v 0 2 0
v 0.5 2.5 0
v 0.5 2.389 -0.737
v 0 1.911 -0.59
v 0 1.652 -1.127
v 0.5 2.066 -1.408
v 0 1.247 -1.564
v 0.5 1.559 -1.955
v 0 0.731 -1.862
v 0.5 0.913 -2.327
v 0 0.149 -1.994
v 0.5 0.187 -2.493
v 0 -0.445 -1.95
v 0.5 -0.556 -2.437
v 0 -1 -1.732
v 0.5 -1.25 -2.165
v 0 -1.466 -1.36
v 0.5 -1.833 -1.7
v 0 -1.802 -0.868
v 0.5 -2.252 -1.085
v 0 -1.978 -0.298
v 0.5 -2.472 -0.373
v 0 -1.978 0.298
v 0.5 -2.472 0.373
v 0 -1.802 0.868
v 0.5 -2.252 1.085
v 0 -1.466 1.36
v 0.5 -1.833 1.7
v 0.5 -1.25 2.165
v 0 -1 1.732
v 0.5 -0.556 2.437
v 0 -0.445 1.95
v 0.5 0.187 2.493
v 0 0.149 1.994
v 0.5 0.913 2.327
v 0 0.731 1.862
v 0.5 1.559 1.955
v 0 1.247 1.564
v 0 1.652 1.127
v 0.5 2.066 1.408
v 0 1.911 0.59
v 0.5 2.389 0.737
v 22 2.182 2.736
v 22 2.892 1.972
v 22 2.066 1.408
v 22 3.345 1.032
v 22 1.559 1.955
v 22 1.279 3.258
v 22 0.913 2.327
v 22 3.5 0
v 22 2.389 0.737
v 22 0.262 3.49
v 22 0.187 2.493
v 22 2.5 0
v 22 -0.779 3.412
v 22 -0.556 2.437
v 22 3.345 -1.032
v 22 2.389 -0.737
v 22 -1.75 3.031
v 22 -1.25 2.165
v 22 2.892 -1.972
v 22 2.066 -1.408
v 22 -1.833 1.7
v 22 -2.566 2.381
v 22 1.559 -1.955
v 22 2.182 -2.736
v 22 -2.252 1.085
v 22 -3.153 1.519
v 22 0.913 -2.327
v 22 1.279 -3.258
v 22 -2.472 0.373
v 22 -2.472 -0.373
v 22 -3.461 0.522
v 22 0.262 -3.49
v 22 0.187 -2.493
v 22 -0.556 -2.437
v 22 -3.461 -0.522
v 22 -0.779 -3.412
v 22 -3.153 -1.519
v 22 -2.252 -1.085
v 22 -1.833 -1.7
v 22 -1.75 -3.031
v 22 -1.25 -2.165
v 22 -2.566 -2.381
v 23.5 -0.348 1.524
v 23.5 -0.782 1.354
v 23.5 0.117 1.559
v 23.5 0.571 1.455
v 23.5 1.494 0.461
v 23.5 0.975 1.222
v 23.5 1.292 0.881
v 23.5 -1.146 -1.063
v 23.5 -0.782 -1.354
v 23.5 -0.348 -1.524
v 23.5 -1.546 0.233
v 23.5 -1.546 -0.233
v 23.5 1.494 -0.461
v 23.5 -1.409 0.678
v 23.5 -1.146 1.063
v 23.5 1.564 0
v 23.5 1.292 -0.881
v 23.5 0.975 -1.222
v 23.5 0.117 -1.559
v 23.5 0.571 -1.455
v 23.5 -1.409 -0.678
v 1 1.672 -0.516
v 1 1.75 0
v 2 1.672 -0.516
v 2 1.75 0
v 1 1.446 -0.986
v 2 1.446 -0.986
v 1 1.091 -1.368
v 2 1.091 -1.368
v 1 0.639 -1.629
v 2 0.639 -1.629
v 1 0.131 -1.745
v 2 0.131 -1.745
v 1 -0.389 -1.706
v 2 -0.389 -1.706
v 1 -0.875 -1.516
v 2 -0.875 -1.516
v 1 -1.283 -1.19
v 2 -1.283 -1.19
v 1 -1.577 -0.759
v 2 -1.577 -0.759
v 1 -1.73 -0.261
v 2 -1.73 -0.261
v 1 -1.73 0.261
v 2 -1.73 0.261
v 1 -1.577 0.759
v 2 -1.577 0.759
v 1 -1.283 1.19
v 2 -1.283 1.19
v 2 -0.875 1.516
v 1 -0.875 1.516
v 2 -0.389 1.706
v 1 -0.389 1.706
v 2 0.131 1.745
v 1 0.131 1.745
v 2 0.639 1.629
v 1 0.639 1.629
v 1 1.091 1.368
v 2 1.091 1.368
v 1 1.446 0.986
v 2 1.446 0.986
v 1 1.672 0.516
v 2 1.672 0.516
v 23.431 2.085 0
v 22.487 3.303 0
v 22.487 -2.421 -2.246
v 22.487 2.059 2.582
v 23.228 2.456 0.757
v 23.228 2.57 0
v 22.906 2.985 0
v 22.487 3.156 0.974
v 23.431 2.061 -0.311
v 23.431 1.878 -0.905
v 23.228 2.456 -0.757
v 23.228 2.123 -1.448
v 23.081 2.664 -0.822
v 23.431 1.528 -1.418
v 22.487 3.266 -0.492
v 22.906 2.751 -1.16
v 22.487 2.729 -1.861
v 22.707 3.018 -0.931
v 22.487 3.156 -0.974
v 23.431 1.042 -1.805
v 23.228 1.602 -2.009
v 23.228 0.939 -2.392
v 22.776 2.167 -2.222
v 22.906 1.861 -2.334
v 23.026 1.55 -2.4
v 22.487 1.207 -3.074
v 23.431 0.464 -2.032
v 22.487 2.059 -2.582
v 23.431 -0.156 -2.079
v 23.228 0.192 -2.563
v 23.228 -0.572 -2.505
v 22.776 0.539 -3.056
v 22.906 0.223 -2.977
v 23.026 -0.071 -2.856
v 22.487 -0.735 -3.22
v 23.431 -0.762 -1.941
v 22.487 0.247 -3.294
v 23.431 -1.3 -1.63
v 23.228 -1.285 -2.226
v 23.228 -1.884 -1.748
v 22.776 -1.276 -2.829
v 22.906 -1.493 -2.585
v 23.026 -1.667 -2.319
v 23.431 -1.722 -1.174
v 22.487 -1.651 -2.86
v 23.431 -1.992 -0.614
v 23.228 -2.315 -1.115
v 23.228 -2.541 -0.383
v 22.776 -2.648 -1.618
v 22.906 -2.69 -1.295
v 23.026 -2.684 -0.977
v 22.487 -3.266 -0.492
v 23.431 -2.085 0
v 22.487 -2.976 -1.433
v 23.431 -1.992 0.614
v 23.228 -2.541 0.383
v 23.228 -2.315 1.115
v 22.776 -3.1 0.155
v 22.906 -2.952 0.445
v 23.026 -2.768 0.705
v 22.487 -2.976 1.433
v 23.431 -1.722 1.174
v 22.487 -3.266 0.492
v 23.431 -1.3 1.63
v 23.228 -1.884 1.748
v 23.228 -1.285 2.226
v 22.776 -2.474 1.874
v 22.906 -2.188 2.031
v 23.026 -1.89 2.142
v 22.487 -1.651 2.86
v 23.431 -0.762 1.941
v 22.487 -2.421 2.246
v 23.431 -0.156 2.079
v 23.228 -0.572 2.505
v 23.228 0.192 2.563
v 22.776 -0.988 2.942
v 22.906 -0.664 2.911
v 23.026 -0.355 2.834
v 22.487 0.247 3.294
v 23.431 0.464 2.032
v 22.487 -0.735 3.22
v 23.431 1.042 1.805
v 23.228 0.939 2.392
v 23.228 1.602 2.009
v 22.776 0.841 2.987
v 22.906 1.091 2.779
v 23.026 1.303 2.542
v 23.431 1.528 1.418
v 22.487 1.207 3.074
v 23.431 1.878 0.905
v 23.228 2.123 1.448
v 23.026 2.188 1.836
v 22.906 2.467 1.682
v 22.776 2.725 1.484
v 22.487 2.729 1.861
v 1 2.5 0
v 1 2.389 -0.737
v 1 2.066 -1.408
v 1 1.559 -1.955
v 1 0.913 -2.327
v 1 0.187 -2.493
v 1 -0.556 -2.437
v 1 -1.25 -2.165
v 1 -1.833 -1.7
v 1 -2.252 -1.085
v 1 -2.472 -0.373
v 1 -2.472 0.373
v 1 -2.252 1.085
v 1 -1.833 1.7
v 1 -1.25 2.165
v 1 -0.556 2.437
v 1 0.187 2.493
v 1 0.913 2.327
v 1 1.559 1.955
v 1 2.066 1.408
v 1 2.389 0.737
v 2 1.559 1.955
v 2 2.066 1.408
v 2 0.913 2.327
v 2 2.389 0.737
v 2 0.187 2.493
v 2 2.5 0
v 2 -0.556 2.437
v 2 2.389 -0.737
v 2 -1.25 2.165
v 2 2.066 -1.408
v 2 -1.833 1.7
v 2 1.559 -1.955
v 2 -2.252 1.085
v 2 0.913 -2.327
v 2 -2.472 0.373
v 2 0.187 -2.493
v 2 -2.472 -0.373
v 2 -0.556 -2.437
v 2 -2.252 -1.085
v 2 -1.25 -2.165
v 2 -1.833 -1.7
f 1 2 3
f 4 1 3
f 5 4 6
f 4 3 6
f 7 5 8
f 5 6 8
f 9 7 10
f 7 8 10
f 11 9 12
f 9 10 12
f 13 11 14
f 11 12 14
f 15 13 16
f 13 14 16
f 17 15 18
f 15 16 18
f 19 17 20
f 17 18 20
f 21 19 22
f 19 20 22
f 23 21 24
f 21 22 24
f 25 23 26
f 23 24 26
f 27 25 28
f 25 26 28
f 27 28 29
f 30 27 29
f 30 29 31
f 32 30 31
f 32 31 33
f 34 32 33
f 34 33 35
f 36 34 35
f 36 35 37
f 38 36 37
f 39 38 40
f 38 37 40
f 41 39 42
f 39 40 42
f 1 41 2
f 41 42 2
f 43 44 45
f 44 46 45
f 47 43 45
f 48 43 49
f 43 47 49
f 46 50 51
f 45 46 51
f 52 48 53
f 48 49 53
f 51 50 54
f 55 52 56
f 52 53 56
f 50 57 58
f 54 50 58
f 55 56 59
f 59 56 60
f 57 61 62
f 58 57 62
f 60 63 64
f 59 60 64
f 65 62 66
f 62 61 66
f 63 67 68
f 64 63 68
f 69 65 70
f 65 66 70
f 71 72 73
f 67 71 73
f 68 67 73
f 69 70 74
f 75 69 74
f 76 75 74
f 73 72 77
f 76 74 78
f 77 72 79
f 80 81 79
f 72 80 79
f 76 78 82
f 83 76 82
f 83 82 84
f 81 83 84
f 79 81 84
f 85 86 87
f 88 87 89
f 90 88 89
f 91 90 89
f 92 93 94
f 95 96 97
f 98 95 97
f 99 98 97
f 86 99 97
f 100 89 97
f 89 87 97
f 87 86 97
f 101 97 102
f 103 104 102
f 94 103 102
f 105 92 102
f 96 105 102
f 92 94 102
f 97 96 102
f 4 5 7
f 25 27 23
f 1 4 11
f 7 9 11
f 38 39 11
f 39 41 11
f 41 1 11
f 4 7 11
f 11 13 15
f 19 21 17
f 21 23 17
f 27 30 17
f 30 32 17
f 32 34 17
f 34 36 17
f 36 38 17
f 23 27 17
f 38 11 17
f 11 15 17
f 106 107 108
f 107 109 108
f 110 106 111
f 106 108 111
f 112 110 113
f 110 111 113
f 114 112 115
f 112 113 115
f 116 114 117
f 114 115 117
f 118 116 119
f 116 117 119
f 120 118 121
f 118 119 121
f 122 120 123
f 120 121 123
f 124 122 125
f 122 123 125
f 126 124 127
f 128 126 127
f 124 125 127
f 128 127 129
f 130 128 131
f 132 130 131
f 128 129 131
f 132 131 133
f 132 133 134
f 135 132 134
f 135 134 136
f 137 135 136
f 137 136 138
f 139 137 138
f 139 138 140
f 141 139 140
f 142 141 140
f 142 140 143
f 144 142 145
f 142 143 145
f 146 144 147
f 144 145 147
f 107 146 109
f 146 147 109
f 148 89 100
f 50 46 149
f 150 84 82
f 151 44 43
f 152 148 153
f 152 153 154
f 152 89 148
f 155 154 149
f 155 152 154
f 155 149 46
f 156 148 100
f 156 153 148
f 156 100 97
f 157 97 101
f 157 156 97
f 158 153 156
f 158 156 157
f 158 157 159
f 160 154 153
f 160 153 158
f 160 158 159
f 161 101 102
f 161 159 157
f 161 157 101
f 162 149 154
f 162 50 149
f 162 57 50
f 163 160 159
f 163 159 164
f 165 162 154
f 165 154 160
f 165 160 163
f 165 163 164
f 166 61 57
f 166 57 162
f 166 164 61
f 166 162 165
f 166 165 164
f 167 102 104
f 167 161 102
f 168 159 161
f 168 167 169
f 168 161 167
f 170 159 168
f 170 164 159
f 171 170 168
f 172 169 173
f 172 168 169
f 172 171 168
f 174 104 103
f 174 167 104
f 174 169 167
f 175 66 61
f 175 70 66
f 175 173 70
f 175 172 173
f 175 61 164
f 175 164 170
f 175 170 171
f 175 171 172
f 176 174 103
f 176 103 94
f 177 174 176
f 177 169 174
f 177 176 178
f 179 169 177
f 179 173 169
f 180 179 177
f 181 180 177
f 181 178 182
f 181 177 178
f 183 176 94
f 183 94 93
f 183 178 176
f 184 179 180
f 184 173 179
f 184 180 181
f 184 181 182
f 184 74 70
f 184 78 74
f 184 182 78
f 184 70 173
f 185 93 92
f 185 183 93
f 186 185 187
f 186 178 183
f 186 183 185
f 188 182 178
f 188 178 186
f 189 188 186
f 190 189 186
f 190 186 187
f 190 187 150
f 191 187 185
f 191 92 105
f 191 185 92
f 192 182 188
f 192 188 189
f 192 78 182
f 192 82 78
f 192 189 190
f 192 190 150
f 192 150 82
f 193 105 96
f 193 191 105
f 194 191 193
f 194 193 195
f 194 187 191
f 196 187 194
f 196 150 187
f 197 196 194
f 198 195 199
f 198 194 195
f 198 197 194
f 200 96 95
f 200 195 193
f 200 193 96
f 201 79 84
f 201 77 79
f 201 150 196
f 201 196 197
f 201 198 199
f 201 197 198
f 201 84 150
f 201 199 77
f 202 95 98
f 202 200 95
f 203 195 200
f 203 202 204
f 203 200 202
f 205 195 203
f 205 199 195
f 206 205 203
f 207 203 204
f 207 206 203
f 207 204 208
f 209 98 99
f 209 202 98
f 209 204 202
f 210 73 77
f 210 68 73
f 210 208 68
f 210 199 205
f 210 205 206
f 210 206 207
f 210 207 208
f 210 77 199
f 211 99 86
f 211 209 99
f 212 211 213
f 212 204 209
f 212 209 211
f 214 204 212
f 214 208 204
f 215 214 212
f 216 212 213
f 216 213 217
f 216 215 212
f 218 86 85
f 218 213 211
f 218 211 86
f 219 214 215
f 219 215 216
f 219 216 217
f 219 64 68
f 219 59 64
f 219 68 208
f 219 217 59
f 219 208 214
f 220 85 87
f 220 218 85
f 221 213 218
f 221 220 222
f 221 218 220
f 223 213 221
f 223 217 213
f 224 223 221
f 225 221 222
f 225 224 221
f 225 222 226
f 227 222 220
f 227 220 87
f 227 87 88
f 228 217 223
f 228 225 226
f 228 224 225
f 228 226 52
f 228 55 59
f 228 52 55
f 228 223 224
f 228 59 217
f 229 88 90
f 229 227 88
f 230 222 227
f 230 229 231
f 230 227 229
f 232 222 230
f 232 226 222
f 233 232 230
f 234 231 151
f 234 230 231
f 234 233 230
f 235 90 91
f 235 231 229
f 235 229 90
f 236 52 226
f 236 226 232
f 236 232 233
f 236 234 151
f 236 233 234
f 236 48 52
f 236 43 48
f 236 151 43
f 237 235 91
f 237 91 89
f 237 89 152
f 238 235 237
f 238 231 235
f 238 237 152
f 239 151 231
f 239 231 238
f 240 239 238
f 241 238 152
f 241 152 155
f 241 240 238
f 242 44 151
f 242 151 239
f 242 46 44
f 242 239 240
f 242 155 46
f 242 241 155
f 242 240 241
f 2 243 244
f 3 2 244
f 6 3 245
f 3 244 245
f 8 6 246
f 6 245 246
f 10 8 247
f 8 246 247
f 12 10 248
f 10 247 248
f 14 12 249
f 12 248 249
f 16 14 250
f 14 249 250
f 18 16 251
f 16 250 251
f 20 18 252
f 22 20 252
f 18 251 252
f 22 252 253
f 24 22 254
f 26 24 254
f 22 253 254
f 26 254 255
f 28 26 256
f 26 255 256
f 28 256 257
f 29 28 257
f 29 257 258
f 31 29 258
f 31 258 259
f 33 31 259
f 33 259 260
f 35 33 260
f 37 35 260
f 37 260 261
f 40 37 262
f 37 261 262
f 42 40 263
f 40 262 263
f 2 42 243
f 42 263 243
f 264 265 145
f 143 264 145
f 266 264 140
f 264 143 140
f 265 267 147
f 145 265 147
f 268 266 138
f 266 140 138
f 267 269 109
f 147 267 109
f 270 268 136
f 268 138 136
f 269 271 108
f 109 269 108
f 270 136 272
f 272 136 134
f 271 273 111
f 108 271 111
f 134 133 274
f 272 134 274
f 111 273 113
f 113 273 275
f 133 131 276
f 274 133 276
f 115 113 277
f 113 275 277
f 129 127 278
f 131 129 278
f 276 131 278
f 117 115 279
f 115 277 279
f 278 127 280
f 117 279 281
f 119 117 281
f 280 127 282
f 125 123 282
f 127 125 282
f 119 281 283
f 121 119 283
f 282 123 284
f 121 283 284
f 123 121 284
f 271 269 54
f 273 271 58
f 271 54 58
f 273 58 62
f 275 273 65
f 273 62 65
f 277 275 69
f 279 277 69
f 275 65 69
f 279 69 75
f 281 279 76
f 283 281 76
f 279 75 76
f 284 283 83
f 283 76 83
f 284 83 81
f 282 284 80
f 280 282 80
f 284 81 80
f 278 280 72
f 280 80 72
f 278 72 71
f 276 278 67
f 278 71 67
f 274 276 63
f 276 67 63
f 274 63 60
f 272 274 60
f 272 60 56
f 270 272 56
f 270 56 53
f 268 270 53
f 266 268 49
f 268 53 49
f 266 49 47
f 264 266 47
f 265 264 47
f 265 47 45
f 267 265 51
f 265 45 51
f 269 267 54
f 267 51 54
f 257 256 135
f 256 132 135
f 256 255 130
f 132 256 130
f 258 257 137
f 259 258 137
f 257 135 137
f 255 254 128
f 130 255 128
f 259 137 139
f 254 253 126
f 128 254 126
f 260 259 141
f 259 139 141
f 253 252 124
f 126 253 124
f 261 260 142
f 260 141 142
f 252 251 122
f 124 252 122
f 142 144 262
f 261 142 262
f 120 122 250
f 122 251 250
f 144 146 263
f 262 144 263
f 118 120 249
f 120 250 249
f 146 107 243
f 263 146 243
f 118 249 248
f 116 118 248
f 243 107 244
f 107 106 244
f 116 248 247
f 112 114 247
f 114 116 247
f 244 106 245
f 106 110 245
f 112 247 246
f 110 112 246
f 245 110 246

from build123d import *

# Parameters (mm, degrees)
FILLET1_R     = 2
CHAMFER1_SIZE = 0.5


with BuildPart() as part:
    # Sketch1 → Revolve1 (revolve)
    with BuildSketch(Plane.XY):
        Polygon((0, 0), (0, 2.5), (1, 2.5), (1, 1.75), (2, 1.75), (2, 2.5), (22, 2.5), (22, 3.5), (23.5, 3.5), (23.5, 0), align=None)
    revolve(axis=Axis((23.5, 0, 0), (-1, 0, 0)))

    # Fillet1
    # the kernel refuses this fillet: 2 mm, written as the material it takes off along each edge
    with BuildSketch(Plane(origin=(23.5, 0, 0), x_dir=(0, 1, 0), z_dir=(0, 0, 1))) as fillet1_piece_1:
        with BuildLine():
            CenterArc((1.563508327, 2), FILLET1_R, 270, 75.522487814)
            Line((1.563508327, 0), (1.563508327, -0.04))
            Line((1.563508327, -0.04), (3.5, -0.04))
            Line((3.5, -0.04), (3.54, 0))
            ThreePointArc((3.54, 0), (3.54, 0.75), (3.538729833, 1.49))
            Line((3.538729833, 1.49), (3.5, 1.5))
        make_face()
    revolve(axis=Axis((23.5, 0, 0), (-1, 0, 0)), mode=Mode.SUBTRACT)

    # Chamfer1
    chamfer1_edges = [part.edges().sort_by_distance(p)[0] for p in [
        (0, -2.5, 0),
    ]]
    chamfer(chamfer1_edges, length=CHAMFER1_SIZE)


solid = part.part
